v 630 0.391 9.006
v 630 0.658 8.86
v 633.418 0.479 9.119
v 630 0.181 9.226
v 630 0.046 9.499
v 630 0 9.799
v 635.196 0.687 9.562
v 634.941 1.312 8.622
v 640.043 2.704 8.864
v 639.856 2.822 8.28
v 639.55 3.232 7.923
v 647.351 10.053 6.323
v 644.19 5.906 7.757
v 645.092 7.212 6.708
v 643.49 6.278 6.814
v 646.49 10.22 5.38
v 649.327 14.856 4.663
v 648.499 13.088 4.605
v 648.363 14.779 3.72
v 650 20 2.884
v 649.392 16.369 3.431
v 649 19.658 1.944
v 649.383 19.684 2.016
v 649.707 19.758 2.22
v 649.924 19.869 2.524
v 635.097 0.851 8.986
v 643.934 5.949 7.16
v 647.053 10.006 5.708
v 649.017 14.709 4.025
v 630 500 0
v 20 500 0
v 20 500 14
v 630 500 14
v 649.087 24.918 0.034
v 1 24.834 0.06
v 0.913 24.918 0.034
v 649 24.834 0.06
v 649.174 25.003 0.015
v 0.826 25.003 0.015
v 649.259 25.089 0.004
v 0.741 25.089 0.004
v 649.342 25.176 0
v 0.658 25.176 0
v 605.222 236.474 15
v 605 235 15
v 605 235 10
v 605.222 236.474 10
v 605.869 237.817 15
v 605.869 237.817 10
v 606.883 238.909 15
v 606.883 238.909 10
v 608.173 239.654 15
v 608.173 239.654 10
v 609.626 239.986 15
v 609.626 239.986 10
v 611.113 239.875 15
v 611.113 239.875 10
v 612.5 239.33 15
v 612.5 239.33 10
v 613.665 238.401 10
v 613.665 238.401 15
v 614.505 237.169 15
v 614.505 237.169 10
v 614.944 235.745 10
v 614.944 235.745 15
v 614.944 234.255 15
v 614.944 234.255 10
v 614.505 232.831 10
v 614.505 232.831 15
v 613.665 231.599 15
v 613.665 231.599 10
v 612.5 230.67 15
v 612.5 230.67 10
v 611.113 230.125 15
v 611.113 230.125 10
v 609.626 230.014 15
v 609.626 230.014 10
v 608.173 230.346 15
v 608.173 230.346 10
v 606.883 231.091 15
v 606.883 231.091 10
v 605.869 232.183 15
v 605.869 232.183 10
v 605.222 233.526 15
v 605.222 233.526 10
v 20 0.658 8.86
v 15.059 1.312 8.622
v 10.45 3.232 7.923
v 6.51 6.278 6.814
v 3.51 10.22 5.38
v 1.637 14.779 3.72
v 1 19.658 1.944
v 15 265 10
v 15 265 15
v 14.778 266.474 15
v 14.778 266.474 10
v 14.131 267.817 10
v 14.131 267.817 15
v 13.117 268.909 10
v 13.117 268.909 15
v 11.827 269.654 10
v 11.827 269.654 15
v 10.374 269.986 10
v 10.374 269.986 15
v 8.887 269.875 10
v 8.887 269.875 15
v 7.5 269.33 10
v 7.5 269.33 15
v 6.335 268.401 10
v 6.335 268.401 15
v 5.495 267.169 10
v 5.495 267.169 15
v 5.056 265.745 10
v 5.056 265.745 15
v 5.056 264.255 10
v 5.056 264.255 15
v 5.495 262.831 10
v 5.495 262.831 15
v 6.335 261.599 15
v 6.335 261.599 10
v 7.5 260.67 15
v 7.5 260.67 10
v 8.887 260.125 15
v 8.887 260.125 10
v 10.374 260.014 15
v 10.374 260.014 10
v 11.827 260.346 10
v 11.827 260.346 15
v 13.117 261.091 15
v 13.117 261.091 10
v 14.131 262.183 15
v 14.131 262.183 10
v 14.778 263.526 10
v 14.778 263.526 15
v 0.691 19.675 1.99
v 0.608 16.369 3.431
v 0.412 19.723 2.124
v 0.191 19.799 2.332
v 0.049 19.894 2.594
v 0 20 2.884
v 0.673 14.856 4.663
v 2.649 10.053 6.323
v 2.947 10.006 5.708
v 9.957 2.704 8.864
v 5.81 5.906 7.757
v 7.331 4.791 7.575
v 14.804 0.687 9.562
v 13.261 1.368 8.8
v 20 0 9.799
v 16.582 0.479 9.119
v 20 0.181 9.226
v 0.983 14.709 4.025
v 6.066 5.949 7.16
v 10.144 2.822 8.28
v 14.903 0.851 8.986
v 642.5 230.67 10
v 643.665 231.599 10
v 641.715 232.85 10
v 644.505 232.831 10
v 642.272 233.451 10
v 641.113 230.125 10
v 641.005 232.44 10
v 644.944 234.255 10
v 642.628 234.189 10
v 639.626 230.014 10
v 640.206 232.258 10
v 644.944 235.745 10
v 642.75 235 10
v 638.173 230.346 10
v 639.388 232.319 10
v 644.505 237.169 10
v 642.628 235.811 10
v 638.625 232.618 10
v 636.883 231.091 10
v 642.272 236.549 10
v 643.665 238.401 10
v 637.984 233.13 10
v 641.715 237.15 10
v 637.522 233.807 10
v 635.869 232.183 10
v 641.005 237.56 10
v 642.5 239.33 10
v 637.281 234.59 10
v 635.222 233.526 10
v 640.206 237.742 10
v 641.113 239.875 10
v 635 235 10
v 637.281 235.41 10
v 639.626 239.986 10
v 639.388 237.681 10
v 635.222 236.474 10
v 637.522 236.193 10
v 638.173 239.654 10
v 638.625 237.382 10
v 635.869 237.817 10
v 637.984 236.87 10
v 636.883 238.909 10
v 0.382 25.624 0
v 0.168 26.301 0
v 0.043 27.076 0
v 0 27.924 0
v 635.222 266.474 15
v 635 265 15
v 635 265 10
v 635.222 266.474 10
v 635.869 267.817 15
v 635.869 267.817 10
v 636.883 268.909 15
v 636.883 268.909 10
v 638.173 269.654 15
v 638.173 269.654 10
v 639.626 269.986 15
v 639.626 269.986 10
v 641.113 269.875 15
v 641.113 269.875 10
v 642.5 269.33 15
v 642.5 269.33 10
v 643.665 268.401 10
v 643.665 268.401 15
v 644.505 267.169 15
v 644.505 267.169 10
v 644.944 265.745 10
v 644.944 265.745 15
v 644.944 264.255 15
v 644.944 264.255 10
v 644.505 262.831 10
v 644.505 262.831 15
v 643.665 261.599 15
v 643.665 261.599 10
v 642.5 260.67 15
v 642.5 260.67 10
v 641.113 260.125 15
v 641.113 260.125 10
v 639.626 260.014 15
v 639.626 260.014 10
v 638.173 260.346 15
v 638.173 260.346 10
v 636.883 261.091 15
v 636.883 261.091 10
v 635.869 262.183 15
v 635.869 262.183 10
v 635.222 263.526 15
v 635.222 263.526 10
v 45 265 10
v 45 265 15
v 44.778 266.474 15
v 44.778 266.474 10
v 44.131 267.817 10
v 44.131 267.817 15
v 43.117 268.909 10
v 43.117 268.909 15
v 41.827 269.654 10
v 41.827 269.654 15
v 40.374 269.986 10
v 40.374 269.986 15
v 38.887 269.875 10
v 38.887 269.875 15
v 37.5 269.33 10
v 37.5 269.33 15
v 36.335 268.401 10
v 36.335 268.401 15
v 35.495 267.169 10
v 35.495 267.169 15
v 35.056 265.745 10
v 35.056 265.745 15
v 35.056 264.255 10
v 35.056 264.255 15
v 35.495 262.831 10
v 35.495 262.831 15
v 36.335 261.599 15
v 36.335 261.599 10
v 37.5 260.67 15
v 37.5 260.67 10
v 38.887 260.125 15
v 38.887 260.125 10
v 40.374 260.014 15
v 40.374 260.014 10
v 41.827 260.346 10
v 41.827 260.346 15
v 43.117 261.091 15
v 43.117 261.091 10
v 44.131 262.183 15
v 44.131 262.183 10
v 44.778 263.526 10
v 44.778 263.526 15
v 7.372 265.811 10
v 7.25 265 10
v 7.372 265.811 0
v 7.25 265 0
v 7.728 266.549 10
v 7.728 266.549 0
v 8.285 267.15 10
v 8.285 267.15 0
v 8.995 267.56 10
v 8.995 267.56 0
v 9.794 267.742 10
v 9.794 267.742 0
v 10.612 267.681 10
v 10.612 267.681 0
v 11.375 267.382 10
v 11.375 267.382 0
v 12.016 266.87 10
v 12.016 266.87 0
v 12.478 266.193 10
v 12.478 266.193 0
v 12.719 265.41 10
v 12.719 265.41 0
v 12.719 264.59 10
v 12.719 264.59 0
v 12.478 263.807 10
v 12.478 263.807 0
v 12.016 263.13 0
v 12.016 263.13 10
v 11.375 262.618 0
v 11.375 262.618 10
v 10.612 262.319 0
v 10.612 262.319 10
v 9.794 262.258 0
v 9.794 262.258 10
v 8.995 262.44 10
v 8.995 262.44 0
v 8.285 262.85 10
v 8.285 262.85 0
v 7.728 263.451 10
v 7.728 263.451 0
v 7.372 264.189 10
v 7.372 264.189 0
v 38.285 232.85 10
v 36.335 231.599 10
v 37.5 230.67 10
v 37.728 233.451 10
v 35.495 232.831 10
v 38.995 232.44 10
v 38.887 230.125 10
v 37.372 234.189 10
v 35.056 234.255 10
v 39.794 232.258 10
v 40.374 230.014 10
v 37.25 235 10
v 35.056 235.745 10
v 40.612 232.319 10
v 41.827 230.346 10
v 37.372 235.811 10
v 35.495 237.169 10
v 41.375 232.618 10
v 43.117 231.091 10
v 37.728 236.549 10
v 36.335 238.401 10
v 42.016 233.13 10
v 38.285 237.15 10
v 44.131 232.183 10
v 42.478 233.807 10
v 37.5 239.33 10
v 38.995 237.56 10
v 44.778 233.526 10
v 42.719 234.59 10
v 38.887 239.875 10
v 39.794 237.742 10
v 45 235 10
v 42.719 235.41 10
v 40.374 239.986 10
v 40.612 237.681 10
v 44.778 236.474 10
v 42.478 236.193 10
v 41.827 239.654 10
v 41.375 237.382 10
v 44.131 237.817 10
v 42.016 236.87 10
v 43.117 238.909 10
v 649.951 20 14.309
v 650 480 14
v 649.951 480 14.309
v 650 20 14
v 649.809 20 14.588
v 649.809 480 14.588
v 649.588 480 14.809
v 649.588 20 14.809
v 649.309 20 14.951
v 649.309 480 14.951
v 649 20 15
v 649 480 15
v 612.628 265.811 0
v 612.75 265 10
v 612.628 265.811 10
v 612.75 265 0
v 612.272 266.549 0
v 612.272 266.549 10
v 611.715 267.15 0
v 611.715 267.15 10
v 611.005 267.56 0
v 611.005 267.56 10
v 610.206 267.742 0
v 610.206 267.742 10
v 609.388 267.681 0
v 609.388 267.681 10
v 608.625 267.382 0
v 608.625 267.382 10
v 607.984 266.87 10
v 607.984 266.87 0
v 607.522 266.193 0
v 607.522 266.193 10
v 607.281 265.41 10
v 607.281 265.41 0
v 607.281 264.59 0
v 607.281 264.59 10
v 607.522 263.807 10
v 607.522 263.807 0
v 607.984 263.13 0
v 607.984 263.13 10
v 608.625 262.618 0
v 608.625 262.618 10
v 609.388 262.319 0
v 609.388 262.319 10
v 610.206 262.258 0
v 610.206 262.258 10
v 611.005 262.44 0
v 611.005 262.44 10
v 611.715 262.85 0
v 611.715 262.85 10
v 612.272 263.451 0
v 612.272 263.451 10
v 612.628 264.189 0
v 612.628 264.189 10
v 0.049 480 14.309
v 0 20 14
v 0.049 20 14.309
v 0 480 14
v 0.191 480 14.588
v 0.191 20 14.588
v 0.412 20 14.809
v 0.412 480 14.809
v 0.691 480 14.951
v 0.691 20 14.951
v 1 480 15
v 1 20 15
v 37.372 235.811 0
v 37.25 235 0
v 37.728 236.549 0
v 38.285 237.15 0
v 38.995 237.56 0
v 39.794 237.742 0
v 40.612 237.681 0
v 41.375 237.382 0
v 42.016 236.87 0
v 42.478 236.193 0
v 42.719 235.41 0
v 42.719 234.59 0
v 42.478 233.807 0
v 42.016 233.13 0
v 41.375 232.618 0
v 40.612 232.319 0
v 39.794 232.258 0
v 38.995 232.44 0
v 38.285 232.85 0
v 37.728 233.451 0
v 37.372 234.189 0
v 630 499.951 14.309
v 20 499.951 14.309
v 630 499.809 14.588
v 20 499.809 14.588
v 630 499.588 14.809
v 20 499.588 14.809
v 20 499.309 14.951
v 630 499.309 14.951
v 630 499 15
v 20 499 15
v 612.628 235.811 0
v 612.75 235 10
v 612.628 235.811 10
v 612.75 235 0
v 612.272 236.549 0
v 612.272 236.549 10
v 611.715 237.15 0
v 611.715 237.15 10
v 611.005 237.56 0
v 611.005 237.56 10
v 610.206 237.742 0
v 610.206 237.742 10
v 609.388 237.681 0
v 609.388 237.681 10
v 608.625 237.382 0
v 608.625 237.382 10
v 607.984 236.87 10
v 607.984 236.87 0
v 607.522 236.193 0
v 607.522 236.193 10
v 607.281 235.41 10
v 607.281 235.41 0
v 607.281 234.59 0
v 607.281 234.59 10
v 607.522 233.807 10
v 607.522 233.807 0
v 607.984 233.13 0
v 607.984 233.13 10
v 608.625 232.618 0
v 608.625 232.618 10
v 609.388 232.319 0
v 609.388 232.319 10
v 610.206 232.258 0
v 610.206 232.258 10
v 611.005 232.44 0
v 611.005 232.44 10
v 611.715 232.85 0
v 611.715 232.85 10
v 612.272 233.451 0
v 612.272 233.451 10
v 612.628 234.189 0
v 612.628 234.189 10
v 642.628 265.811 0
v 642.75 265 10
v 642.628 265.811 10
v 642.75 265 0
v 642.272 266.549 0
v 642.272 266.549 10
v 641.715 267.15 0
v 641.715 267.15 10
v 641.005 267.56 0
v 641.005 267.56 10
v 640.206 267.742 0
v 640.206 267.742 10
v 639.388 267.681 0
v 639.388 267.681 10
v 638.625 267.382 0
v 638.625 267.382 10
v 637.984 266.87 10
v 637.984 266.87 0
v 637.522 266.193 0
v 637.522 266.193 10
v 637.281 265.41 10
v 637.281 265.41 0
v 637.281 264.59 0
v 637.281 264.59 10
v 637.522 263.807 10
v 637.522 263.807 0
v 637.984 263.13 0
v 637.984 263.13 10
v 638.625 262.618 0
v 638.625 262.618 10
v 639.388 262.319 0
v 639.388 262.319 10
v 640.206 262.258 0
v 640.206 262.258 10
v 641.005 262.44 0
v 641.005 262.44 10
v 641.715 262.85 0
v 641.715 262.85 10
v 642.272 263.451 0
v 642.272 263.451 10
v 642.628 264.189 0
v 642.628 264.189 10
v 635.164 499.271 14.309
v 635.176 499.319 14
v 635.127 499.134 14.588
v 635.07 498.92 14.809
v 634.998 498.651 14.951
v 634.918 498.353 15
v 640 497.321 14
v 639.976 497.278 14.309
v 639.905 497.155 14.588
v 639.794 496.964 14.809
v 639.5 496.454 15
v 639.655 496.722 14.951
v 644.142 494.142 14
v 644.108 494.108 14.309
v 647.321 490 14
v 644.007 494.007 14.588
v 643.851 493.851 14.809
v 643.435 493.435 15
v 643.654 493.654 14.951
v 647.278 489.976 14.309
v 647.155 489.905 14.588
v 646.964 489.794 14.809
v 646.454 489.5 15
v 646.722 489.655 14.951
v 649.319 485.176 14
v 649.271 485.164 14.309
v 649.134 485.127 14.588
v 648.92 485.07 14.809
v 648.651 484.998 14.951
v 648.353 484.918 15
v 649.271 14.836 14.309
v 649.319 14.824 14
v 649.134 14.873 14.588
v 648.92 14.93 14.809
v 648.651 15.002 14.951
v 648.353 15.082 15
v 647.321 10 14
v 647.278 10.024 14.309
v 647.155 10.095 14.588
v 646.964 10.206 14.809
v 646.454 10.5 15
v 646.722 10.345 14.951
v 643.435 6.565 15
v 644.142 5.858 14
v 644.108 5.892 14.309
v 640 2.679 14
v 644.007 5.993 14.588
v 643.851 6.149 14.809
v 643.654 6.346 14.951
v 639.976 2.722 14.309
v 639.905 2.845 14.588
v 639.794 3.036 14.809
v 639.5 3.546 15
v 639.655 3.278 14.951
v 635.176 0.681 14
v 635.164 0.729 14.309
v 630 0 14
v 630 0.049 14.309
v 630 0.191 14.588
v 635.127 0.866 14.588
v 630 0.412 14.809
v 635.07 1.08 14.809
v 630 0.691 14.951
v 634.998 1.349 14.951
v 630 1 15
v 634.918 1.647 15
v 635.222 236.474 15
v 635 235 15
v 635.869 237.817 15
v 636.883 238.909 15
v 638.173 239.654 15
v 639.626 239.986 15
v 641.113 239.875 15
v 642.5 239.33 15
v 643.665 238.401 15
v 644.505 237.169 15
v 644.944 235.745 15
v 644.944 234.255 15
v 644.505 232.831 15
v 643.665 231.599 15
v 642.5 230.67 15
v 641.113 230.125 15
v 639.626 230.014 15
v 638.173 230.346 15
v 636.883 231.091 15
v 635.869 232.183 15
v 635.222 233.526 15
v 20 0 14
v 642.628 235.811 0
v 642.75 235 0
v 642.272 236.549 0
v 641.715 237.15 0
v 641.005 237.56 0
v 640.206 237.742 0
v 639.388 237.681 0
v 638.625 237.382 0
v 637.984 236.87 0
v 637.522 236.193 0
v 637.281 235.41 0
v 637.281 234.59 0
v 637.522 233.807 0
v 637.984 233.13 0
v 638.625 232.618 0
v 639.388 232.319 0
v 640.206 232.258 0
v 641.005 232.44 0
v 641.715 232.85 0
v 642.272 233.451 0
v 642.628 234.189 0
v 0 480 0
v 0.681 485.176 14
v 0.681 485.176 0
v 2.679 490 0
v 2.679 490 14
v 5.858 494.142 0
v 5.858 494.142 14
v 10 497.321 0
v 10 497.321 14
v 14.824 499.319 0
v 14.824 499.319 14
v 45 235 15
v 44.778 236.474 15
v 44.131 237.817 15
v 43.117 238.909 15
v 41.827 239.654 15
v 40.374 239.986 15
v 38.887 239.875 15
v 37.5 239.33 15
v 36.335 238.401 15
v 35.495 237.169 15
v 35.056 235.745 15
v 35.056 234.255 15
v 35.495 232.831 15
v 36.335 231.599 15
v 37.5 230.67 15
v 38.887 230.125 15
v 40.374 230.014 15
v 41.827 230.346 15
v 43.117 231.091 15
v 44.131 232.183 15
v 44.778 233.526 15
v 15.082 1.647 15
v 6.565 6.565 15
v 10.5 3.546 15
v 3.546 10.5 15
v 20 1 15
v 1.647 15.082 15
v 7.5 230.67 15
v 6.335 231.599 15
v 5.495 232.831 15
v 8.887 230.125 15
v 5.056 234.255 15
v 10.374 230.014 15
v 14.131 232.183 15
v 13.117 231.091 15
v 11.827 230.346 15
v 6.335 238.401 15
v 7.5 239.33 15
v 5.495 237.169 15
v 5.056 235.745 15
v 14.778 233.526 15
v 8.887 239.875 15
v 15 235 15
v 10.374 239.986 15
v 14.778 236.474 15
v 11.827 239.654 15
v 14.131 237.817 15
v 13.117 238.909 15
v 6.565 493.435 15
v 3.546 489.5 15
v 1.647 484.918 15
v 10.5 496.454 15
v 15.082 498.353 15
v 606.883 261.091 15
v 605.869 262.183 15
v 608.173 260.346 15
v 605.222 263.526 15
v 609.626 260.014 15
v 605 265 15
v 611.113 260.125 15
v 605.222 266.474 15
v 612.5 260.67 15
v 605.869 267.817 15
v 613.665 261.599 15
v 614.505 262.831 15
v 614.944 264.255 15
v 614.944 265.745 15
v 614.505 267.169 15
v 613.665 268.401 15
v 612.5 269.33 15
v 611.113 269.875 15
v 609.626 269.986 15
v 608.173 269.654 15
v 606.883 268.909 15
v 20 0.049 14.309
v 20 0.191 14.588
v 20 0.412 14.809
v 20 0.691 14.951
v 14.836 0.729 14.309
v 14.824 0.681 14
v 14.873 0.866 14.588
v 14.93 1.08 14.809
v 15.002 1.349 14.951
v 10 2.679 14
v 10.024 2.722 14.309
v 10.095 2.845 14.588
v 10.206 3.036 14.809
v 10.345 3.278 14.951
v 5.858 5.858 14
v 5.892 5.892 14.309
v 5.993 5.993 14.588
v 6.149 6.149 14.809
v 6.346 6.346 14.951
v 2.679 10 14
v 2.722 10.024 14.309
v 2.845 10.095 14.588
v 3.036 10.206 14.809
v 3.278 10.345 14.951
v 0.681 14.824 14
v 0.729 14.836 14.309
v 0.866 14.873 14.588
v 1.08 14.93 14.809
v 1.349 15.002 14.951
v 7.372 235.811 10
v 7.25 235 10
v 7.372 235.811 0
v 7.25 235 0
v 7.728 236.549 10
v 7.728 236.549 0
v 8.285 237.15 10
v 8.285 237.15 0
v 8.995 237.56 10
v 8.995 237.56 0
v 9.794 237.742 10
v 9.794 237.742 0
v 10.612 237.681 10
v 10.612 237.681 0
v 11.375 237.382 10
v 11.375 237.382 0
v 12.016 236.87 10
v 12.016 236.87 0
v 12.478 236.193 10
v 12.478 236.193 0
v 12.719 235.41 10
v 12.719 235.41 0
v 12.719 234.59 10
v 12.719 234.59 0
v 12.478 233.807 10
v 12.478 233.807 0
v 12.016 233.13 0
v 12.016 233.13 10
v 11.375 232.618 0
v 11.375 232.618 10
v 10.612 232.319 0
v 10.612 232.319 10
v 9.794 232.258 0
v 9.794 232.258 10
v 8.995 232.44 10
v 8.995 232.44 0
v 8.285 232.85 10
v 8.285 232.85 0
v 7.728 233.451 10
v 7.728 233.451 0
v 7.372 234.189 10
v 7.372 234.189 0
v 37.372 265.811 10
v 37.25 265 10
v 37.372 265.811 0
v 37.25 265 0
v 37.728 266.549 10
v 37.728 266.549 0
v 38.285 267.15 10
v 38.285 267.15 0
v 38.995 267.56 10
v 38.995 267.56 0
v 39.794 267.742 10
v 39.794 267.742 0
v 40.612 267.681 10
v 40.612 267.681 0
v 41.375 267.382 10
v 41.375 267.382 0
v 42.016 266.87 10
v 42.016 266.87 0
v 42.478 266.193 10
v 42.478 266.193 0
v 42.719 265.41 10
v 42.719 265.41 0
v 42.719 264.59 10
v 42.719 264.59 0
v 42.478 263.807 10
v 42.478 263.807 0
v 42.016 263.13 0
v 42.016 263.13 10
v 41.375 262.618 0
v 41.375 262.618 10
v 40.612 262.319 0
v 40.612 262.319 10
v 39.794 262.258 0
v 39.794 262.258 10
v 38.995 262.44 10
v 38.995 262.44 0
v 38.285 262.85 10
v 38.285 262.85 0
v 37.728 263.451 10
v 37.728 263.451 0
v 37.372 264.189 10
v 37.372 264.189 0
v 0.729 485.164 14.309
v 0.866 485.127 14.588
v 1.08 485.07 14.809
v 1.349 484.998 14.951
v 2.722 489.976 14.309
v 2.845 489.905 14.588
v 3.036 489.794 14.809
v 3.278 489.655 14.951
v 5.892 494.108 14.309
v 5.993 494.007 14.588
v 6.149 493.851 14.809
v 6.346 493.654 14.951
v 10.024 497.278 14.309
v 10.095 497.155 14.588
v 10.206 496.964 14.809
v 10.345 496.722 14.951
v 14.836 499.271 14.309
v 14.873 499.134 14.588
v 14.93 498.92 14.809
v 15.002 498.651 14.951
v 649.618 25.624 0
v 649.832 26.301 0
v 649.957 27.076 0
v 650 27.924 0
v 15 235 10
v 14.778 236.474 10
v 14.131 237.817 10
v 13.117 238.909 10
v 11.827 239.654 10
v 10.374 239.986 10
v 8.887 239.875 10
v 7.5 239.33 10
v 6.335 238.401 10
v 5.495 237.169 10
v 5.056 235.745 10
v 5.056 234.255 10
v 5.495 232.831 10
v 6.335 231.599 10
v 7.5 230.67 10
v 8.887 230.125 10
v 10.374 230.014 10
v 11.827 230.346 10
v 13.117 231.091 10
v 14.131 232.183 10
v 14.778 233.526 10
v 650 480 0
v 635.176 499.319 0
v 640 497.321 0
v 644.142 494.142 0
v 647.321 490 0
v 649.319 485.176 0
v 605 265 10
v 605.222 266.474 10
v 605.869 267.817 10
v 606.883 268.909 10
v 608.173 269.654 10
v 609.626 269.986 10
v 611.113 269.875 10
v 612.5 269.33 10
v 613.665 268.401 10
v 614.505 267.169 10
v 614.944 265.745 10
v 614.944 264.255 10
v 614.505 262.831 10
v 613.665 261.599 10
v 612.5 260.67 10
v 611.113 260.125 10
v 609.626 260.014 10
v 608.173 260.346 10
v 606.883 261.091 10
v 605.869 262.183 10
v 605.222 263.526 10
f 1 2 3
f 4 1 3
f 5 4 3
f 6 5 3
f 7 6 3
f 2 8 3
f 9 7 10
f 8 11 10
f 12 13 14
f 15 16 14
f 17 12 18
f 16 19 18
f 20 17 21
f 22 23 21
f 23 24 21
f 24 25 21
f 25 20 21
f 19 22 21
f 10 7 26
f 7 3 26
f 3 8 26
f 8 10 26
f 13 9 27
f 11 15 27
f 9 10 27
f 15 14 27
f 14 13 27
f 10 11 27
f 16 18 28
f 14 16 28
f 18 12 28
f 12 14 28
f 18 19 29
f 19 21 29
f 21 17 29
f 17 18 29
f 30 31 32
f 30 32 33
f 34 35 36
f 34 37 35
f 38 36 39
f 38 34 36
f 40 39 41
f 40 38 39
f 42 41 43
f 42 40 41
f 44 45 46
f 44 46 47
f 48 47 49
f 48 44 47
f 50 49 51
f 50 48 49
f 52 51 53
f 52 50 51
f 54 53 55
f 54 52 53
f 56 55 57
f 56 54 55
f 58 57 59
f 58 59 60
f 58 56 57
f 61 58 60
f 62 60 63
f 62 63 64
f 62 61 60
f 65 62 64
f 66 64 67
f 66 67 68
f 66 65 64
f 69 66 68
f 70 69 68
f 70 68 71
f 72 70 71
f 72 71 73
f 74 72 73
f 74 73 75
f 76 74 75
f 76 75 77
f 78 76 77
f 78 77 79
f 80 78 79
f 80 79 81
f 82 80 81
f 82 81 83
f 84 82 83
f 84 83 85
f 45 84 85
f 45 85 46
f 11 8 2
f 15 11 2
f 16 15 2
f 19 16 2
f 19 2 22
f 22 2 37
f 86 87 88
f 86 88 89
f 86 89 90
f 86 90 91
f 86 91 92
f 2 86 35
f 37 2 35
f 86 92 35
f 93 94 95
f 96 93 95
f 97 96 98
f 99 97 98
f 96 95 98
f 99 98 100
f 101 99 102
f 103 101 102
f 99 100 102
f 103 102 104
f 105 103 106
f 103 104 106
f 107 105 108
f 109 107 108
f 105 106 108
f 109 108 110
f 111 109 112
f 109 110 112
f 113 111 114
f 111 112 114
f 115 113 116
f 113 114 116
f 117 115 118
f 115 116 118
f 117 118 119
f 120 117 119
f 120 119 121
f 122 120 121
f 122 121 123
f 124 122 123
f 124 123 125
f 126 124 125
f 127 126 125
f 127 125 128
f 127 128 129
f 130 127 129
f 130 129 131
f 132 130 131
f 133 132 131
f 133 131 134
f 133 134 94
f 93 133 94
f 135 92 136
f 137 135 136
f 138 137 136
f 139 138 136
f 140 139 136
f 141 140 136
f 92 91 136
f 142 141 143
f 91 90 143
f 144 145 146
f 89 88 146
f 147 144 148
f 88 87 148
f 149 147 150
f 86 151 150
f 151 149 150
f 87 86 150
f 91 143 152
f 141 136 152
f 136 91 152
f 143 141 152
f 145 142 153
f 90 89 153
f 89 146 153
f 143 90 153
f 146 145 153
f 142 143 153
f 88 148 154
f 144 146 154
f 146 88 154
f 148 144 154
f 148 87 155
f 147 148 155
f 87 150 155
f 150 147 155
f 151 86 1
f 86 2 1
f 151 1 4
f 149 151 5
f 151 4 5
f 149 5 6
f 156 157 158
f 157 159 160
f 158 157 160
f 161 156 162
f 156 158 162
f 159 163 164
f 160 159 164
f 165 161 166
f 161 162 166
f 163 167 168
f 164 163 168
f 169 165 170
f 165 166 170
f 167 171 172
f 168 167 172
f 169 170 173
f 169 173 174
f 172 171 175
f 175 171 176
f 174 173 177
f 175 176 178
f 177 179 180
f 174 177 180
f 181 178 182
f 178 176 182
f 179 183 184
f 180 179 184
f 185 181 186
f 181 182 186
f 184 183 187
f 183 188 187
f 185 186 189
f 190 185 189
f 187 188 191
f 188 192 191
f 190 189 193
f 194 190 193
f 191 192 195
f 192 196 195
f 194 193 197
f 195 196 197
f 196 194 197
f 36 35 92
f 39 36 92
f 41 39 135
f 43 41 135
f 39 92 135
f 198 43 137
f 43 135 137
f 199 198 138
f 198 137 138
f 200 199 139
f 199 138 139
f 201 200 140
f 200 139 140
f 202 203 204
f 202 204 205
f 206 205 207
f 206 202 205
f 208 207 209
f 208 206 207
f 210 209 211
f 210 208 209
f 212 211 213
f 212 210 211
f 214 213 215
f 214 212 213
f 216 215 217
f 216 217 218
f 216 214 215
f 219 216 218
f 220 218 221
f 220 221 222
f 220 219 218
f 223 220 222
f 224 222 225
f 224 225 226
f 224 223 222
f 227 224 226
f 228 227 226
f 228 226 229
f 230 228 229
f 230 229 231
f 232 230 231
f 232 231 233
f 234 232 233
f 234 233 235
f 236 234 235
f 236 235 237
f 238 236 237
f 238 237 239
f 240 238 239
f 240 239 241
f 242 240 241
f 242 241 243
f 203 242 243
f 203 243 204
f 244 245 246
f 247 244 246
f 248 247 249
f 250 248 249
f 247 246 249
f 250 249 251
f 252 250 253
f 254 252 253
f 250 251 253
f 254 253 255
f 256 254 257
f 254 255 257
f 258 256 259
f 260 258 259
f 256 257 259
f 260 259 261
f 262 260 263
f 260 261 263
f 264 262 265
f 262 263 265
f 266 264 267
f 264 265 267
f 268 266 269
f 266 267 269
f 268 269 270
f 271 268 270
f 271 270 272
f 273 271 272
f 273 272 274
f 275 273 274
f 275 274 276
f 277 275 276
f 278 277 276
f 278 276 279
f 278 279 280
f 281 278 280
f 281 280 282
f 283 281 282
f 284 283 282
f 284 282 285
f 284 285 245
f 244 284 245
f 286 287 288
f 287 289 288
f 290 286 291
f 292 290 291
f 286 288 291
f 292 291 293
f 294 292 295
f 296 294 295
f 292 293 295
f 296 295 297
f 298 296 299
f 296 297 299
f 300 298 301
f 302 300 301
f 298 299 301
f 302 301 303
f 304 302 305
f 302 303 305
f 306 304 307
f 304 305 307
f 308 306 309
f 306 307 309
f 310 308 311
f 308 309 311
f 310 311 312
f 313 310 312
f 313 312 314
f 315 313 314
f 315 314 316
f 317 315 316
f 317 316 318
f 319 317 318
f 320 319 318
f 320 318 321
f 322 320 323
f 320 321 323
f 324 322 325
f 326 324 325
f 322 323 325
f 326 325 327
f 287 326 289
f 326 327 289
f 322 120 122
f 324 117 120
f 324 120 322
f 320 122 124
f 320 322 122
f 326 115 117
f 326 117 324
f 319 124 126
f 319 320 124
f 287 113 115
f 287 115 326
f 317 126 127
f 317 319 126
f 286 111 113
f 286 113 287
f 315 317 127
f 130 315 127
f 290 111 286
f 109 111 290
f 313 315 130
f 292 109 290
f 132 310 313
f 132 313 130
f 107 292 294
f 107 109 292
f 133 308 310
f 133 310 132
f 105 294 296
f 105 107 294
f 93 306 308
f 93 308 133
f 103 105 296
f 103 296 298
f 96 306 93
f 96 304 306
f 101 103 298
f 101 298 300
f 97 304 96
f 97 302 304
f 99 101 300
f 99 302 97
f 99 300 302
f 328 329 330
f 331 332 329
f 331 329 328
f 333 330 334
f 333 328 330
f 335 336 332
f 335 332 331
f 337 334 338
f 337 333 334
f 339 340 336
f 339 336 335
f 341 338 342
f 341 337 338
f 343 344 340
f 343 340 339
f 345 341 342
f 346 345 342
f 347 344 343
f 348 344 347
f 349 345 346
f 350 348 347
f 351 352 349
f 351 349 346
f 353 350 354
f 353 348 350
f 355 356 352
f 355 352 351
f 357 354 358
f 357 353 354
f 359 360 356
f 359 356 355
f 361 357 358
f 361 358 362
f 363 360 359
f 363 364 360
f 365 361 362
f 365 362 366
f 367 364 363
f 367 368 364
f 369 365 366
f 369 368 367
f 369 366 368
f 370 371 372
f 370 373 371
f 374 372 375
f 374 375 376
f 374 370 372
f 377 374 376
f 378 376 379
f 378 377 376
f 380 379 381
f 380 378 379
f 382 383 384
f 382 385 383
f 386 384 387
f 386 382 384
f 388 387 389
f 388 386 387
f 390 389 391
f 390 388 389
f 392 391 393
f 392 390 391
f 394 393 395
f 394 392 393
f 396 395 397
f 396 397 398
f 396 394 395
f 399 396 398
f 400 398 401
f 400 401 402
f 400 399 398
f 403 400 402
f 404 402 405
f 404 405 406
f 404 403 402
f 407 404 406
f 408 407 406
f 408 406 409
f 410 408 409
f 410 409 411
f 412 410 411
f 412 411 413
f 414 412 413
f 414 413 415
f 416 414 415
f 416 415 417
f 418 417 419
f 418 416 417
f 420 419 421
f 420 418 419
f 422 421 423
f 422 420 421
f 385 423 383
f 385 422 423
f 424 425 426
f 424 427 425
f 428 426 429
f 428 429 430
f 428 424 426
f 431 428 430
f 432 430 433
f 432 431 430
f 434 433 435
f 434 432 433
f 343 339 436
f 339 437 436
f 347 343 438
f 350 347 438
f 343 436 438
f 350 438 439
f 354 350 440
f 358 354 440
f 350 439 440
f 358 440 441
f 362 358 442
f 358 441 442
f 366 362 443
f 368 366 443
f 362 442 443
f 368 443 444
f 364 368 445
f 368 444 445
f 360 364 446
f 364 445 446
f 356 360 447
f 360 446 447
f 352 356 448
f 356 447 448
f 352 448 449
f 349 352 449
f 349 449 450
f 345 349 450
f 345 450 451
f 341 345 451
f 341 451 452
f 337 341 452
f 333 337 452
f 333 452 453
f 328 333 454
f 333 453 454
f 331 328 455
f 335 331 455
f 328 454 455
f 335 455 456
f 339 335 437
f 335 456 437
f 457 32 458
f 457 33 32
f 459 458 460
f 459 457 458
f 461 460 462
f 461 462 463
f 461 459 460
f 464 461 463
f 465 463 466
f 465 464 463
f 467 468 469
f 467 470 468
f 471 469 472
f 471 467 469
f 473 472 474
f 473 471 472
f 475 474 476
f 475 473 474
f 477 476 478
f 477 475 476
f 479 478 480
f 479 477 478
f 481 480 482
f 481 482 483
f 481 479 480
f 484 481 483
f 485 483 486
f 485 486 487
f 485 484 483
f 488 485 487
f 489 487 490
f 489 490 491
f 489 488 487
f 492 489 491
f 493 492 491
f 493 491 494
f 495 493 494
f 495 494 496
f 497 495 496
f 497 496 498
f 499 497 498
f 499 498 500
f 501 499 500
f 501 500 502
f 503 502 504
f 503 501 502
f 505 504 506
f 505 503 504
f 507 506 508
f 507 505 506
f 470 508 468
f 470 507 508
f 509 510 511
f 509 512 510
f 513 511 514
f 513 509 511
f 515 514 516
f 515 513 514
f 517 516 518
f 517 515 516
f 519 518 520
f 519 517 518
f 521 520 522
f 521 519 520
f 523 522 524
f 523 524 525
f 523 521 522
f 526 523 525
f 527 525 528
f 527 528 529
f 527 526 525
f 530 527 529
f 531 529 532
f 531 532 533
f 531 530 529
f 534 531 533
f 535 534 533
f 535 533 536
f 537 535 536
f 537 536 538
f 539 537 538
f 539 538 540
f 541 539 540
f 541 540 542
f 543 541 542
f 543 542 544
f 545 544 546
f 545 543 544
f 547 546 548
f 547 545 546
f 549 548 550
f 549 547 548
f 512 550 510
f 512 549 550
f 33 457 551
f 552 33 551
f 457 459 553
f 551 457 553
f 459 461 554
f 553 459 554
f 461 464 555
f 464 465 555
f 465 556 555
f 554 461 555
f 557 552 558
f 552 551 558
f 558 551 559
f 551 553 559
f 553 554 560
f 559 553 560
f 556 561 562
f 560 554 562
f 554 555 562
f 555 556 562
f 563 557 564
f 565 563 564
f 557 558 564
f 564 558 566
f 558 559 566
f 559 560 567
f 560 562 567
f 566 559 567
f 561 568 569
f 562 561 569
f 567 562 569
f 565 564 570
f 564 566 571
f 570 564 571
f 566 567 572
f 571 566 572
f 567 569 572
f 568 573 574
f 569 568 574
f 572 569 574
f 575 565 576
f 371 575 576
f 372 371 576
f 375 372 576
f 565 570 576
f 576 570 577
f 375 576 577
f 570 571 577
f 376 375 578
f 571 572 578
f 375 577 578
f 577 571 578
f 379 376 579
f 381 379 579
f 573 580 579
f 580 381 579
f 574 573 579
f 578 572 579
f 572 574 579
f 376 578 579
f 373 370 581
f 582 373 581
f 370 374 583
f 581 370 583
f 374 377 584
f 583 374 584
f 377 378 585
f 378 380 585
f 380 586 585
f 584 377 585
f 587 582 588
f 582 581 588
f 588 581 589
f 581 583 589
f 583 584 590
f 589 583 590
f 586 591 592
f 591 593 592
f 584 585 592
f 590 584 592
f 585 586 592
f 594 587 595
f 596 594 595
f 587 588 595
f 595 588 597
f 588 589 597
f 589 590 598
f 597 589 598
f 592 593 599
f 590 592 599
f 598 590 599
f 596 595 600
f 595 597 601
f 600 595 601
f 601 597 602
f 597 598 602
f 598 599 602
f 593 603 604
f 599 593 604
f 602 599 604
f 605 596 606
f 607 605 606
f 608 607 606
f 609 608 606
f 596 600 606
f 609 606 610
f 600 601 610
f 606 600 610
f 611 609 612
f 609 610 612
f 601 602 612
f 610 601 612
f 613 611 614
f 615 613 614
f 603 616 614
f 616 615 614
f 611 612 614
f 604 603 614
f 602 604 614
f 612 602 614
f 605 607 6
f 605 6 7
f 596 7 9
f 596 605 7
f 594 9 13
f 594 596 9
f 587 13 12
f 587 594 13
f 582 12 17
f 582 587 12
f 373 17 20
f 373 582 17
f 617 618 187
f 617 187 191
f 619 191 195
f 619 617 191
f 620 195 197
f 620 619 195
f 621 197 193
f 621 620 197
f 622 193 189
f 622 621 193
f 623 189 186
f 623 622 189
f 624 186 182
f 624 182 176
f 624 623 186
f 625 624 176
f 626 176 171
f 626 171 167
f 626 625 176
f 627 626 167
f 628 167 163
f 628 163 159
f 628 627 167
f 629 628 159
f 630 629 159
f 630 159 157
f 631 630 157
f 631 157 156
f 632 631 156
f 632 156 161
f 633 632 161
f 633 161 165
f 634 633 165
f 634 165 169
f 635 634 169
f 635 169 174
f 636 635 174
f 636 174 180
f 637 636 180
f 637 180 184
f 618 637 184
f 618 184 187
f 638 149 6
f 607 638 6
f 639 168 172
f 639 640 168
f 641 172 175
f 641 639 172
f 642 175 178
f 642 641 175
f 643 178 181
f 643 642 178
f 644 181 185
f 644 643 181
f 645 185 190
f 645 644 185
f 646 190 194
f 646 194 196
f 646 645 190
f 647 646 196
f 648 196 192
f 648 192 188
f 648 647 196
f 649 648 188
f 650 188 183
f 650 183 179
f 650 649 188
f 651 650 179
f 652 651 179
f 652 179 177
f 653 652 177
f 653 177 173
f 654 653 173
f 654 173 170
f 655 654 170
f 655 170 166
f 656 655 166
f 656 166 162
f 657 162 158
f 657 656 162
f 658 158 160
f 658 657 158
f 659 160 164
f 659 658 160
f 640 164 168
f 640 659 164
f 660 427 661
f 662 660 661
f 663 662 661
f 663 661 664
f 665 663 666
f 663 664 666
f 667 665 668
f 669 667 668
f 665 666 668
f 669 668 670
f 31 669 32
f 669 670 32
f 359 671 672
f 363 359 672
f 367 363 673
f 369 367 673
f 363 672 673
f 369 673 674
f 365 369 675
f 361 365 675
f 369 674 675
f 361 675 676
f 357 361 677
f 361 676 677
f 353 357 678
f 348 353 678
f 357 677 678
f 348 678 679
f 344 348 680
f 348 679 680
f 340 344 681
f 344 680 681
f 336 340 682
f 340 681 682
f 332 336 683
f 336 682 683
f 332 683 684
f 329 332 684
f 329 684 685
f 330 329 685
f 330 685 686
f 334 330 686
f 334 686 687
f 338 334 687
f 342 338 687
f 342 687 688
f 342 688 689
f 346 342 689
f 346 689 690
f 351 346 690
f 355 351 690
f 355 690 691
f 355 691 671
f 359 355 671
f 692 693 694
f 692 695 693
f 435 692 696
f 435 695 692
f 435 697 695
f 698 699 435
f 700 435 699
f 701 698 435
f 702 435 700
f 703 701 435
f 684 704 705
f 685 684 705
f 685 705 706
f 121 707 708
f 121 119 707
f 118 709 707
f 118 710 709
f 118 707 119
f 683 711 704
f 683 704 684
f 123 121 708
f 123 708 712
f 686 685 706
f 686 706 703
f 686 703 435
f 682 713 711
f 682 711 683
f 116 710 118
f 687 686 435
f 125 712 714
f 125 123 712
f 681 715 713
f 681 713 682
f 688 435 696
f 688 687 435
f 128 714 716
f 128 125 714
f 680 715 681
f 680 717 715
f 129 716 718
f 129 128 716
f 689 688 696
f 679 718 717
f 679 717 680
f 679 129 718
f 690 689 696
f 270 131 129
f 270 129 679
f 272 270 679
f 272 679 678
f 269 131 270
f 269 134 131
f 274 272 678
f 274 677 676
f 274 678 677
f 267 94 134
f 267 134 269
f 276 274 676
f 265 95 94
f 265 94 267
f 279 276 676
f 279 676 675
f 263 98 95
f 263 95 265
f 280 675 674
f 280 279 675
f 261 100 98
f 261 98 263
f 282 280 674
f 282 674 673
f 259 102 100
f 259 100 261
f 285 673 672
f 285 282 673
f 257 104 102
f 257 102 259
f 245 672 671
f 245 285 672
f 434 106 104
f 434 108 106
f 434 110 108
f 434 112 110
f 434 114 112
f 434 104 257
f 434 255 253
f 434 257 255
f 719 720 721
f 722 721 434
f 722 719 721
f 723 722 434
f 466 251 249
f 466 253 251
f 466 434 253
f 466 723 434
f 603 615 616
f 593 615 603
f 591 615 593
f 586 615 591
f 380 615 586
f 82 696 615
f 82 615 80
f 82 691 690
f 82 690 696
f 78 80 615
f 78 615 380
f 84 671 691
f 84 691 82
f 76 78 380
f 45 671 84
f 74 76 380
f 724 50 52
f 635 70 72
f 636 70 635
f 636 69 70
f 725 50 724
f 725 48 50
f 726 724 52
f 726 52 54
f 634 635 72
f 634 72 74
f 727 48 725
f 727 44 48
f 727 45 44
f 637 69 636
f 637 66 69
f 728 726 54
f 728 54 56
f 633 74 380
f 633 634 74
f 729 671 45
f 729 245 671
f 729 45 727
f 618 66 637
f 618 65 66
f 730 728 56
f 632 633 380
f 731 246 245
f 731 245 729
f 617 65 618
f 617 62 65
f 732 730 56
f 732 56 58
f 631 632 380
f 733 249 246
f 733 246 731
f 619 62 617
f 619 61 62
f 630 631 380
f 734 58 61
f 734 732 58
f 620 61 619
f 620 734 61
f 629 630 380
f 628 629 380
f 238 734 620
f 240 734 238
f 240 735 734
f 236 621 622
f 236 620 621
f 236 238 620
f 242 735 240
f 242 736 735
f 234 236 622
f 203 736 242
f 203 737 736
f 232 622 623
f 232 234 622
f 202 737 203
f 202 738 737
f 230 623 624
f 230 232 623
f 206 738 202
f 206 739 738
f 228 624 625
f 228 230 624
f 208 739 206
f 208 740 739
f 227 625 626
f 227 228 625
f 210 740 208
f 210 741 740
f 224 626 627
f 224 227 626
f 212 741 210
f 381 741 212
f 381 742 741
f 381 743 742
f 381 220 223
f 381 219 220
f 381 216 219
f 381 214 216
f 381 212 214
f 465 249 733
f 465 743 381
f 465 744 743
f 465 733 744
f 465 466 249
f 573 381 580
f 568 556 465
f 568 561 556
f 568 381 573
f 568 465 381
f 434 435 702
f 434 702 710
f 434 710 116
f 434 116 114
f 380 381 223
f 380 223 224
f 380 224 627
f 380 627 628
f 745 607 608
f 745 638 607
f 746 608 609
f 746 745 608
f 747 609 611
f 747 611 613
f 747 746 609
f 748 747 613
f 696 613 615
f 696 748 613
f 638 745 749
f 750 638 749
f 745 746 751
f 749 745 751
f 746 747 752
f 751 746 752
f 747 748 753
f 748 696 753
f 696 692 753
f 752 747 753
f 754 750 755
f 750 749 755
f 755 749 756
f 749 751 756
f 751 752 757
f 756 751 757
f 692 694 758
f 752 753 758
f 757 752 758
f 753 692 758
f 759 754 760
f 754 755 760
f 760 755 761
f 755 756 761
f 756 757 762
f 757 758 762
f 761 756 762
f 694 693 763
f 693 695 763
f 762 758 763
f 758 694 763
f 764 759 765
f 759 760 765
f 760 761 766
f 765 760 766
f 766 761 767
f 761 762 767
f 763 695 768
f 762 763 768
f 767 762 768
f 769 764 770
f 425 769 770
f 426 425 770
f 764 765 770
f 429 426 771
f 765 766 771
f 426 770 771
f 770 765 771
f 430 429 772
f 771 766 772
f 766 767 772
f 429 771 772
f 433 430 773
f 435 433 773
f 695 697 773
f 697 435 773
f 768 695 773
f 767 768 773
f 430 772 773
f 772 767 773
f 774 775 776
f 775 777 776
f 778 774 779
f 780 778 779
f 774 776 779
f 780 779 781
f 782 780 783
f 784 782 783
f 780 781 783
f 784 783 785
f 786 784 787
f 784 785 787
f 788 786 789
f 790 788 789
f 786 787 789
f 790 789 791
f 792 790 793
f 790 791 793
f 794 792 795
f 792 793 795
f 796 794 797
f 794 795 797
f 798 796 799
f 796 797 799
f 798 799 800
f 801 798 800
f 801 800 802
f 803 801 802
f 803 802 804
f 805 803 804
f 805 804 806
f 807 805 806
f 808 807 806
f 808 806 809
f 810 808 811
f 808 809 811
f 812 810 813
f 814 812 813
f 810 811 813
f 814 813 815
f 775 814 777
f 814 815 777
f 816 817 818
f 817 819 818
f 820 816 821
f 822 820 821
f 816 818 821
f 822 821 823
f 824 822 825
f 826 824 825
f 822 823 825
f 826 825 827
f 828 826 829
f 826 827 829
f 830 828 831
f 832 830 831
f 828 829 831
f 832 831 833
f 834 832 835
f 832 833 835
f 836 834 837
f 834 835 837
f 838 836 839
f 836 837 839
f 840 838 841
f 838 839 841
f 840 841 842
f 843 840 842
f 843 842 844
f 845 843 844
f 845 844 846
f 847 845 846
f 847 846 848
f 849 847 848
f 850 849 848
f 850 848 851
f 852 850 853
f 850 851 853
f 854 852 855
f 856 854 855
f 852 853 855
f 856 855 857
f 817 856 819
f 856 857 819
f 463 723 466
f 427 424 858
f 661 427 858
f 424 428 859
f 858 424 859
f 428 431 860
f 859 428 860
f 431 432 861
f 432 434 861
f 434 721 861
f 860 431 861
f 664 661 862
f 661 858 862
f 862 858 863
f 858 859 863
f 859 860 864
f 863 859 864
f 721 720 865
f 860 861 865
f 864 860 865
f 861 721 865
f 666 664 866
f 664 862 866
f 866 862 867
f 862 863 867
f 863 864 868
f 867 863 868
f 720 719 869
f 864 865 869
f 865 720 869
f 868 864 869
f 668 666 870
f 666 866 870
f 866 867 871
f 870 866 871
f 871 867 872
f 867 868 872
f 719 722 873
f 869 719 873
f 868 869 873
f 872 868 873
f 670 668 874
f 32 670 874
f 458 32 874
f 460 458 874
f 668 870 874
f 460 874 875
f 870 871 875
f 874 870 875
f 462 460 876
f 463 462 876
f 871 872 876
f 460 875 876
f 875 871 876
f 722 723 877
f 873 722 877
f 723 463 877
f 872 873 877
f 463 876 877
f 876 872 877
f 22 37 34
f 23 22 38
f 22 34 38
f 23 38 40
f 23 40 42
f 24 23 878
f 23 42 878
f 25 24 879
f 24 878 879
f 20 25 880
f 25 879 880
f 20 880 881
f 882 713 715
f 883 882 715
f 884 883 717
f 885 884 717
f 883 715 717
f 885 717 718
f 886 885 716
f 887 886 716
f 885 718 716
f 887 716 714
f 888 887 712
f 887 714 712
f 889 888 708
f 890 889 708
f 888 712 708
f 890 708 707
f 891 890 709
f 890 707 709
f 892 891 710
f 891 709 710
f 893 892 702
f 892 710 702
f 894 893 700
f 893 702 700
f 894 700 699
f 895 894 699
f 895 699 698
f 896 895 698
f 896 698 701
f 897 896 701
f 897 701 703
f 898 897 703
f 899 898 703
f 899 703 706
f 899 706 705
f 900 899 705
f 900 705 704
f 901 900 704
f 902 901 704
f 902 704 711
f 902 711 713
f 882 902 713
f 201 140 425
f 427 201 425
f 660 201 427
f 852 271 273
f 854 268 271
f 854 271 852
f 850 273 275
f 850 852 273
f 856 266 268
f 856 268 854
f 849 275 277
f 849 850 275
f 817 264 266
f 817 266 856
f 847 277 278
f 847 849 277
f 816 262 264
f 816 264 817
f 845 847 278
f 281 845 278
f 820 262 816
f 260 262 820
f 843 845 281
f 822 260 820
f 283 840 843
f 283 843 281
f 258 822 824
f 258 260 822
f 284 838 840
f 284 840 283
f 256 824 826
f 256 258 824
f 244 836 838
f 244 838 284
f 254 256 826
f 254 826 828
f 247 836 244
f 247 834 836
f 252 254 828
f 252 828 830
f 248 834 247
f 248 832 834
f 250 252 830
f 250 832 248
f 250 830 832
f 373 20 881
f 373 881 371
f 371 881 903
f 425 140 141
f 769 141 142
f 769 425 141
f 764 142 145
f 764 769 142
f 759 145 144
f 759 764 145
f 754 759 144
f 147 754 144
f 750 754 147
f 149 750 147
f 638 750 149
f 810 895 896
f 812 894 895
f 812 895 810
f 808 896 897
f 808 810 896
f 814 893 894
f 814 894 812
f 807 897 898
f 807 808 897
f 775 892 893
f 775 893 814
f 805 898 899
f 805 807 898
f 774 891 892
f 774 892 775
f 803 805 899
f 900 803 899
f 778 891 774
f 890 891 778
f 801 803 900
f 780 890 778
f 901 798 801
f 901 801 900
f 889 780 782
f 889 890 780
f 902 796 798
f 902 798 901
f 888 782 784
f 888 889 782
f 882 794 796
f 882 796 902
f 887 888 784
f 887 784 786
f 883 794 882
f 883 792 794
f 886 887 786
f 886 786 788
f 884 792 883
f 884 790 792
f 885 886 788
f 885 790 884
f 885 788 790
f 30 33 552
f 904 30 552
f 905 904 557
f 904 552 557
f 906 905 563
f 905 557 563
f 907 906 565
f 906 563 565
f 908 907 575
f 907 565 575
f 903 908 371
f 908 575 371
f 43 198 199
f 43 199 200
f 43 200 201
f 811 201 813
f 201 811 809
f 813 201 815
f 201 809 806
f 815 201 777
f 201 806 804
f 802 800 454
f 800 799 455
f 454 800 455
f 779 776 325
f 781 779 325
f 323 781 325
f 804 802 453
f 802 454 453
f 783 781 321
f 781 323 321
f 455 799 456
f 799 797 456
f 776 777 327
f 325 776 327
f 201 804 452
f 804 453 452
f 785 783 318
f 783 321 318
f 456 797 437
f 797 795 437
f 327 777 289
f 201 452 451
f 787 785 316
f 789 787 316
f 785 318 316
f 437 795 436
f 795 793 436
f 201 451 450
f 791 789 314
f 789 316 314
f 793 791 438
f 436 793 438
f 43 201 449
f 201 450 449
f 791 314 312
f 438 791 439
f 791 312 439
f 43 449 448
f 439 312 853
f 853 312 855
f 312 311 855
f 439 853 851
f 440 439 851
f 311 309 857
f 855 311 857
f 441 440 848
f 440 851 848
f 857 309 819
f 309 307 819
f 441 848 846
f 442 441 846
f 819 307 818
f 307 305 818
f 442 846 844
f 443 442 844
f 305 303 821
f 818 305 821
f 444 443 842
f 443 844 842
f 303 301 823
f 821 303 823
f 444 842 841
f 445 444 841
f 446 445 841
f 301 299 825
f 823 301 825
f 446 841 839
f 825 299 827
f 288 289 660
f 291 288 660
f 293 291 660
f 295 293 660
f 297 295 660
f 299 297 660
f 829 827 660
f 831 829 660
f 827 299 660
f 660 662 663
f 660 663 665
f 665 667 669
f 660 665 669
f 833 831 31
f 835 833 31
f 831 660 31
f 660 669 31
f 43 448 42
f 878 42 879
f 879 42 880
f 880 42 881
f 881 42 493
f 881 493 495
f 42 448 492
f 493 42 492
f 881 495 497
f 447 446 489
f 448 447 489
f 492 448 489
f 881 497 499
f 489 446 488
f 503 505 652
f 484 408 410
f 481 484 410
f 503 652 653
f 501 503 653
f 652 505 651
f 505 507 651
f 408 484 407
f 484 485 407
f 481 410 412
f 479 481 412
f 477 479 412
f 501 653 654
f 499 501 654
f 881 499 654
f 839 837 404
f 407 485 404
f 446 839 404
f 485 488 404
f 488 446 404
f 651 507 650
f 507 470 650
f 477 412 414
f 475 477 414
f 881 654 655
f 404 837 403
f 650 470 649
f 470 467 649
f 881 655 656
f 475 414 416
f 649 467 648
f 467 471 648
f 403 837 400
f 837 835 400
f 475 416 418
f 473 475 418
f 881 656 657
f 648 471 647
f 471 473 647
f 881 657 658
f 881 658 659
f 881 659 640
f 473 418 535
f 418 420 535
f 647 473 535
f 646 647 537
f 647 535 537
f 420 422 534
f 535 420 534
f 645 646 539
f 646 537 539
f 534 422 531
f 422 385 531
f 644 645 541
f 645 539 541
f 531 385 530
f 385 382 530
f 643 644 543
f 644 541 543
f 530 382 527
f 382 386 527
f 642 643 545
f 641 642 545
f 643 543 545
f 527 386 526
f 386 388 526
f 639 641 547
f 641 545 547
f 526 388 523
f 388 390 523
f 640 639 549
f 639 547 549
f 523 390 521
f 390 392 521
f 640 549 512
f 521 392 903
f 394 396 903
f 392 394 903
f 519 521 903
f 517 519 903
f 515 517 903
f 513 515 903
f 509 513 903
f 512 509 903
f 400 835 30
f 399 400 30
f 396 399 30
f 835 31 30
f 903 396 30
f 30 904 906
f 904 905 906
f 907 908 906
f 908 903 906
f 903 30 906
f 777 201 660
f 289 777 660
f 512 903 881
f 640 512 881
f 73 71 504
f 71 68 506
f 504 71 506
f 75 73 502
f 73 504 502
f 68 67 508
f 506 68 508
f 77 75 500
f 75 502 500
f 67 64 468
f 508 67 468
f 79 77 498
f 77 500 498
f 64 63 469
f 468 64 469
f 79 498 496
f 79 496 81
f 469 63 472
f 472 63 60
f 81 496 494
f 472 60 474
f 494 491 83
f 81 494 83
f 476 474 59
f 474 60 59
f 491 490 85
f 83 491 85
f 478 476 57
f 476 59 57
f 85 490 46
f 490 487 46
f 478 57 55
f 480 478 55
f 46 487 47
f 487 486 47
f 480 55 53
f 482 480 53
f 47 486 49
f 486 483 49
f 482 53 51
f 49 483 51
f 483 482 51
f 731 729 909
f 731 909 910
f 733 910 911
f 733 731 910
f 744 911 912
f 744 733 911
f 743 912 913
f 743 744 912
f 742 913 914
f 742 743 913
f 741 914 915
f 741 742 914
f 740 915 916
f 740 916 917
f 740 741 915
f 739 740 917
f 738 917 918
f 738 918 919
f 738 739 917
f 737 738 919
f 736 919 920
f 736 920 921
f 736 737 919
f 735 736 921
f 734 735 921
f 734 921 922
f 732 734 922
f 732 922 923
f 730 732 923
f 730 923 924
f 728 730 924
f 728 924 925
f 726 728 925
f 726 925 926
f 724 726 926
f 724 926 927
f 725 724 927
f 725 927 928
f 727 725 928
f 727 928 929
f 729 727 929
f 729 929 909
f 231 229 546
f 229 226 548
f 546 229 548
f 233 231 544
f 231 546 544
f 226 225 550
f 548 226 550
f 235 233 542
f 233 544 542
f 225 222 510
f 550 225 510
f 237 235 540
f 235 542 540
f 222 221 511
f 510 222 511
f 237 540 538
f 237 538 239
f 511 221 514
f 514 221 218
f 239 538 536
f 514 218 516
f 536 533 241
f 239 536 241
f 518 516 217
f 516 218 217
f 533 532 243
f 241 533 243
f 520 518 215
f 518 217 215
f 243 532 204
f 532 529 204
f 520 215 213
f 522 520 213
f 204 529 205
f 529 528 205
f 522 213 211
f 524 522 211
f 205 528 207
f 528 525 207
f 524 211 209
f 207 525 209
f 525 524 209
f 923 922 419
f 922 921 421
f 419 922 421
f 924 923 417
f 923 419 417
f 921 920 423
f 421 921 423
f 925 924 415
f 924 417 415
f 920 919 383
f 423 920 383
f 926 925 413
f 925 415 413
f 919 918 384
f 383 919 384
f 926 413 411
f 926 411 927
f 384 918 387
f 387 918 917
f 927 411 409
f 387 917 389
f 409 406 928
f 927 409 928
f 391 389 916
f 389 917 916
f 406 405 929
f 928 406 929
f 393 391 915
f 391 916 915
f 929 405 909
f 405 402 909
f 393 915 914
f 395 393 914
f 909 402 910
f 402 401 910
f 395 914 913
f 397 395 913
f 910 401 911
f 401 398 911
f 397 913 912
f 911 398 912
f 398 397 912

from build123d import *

# Parameters (mm, degrees)
SKETCH1_W                              = 650
SKETCH1_H                              = 500
BASE_DEPTH                             = 15
COUNTERBORED_M5_BOLT_HOLES_D           = 5.5
COUNTERBORED_M5_BOLT_HOLES_CBORE_D     = 10
COUNTERBORED_M5_BOLT_HOLES_CBORE_DEPTH = 5
ROUND_CORNERS_R                        = 20
BREAK_TOP_EDGE_R                       = 1
CHAMFER2_SIZE                          = 9.099255857
CHAMFER2_SIZE_2                        = 25
FILLET3_R                              = 1


with BuildPart() as part:
    # Sketch1 → base (new body)
    with BuildSketch(Plane.XY):
        with Locations((325, 250)):
            Rectangle(SKETCH1_W, SKETCH1_H)
    extrude(amount=BASE_DEPTH)

    # counterbored M5 bolt holes (through all)
    with Locations(Plane.XY.offset(15)):
        with Locations((10, 265), (40, 235), (10, 235), (40, 265)):
            counterbored_m5_bolt_holes = CounterBoreHole(COUNTERBORED_M5_BOLT_HOLES_D / 2, COUNTERBORED_M5_BOLT_HOLES_CBORE_D / 2, COUNTERBORED_M5_BOLT_HOLES_CBORE_DEPTH)

    # mirror counterbored bolt holes: counterbored M5 bolt holes across plane
    add(counterbored_m5_bolt_holes.mirror(Plane.ZY.offset(-325)), mode=Mode.SUBTRACT)

    # round corners
    round_corners_edges = [part.edges().sort_by_distance(p)[0] for p in [
        (0, 500, 7.5),
        (650, 500, 7.5),
        (650, 0, 7.5),
        (0, 0, 7.5),
    ]]
    fillet(round_corners_edges, radius=ROUND_CORNERS_R)

    # break top edge
    break_top_edge_edges = [part.edges().sort_by_distance(p)[0] for p in [
        (0, 250, 15),
        (325, 500, 15),
        (325, 0, 15),
        (650, 250, 15),
        (5.857864376, 5.857864376, 15),
        (644.142135624, 5.857864376, 15),
        (644.142135624, 494.142135624, 15),
        (5.857864376, 494.142135624, 15),
    ]]
    fillet(break_top_edge_edges, radius=BREAK_TOP_EDGE_R)

    # Chamfer2
    # the kernel refuses this chamfer: 25, 9.099255857 mm, written as the material it takes off along each edge
    with BuildSketch(Plane(origin=(-44.854868314, 0, 0), x_dir=(0, -0.09904090225204935, 0.9950833631817486), z_dir=(1, 0, 0))) as chamfer2_piece_1:
        Polygon((CHAMFER2_SIZE * 0.995083363144, -CHAMFER2_SIZE * 0.0990409022483), (-CHAMFER2_SIZE_2 * 0.099040902252, -CHAMFER2_SIZE_2 * 0.995083363182), (0, 0), align=None)
    extrude(amount=739.709736628, mode=Mode.SUBTRACT)

    # Fillet3
    fillet3_edges = [part.edges().sort_by_distance(p)[0] for p in [
        (325, 0, 9.099255857),
        (644.360022397, 6.079161061, 6.886622181),
        (650, 22.5, 0.909925586),
        (325, 25, 0),
        (0, 22.5, 0.909925586),
        (5.639977603, 6.079161061, 6.886622181),
    ]]
    fillet(fillet3_edges, radius=FILLET3_R)


solid = part.part
